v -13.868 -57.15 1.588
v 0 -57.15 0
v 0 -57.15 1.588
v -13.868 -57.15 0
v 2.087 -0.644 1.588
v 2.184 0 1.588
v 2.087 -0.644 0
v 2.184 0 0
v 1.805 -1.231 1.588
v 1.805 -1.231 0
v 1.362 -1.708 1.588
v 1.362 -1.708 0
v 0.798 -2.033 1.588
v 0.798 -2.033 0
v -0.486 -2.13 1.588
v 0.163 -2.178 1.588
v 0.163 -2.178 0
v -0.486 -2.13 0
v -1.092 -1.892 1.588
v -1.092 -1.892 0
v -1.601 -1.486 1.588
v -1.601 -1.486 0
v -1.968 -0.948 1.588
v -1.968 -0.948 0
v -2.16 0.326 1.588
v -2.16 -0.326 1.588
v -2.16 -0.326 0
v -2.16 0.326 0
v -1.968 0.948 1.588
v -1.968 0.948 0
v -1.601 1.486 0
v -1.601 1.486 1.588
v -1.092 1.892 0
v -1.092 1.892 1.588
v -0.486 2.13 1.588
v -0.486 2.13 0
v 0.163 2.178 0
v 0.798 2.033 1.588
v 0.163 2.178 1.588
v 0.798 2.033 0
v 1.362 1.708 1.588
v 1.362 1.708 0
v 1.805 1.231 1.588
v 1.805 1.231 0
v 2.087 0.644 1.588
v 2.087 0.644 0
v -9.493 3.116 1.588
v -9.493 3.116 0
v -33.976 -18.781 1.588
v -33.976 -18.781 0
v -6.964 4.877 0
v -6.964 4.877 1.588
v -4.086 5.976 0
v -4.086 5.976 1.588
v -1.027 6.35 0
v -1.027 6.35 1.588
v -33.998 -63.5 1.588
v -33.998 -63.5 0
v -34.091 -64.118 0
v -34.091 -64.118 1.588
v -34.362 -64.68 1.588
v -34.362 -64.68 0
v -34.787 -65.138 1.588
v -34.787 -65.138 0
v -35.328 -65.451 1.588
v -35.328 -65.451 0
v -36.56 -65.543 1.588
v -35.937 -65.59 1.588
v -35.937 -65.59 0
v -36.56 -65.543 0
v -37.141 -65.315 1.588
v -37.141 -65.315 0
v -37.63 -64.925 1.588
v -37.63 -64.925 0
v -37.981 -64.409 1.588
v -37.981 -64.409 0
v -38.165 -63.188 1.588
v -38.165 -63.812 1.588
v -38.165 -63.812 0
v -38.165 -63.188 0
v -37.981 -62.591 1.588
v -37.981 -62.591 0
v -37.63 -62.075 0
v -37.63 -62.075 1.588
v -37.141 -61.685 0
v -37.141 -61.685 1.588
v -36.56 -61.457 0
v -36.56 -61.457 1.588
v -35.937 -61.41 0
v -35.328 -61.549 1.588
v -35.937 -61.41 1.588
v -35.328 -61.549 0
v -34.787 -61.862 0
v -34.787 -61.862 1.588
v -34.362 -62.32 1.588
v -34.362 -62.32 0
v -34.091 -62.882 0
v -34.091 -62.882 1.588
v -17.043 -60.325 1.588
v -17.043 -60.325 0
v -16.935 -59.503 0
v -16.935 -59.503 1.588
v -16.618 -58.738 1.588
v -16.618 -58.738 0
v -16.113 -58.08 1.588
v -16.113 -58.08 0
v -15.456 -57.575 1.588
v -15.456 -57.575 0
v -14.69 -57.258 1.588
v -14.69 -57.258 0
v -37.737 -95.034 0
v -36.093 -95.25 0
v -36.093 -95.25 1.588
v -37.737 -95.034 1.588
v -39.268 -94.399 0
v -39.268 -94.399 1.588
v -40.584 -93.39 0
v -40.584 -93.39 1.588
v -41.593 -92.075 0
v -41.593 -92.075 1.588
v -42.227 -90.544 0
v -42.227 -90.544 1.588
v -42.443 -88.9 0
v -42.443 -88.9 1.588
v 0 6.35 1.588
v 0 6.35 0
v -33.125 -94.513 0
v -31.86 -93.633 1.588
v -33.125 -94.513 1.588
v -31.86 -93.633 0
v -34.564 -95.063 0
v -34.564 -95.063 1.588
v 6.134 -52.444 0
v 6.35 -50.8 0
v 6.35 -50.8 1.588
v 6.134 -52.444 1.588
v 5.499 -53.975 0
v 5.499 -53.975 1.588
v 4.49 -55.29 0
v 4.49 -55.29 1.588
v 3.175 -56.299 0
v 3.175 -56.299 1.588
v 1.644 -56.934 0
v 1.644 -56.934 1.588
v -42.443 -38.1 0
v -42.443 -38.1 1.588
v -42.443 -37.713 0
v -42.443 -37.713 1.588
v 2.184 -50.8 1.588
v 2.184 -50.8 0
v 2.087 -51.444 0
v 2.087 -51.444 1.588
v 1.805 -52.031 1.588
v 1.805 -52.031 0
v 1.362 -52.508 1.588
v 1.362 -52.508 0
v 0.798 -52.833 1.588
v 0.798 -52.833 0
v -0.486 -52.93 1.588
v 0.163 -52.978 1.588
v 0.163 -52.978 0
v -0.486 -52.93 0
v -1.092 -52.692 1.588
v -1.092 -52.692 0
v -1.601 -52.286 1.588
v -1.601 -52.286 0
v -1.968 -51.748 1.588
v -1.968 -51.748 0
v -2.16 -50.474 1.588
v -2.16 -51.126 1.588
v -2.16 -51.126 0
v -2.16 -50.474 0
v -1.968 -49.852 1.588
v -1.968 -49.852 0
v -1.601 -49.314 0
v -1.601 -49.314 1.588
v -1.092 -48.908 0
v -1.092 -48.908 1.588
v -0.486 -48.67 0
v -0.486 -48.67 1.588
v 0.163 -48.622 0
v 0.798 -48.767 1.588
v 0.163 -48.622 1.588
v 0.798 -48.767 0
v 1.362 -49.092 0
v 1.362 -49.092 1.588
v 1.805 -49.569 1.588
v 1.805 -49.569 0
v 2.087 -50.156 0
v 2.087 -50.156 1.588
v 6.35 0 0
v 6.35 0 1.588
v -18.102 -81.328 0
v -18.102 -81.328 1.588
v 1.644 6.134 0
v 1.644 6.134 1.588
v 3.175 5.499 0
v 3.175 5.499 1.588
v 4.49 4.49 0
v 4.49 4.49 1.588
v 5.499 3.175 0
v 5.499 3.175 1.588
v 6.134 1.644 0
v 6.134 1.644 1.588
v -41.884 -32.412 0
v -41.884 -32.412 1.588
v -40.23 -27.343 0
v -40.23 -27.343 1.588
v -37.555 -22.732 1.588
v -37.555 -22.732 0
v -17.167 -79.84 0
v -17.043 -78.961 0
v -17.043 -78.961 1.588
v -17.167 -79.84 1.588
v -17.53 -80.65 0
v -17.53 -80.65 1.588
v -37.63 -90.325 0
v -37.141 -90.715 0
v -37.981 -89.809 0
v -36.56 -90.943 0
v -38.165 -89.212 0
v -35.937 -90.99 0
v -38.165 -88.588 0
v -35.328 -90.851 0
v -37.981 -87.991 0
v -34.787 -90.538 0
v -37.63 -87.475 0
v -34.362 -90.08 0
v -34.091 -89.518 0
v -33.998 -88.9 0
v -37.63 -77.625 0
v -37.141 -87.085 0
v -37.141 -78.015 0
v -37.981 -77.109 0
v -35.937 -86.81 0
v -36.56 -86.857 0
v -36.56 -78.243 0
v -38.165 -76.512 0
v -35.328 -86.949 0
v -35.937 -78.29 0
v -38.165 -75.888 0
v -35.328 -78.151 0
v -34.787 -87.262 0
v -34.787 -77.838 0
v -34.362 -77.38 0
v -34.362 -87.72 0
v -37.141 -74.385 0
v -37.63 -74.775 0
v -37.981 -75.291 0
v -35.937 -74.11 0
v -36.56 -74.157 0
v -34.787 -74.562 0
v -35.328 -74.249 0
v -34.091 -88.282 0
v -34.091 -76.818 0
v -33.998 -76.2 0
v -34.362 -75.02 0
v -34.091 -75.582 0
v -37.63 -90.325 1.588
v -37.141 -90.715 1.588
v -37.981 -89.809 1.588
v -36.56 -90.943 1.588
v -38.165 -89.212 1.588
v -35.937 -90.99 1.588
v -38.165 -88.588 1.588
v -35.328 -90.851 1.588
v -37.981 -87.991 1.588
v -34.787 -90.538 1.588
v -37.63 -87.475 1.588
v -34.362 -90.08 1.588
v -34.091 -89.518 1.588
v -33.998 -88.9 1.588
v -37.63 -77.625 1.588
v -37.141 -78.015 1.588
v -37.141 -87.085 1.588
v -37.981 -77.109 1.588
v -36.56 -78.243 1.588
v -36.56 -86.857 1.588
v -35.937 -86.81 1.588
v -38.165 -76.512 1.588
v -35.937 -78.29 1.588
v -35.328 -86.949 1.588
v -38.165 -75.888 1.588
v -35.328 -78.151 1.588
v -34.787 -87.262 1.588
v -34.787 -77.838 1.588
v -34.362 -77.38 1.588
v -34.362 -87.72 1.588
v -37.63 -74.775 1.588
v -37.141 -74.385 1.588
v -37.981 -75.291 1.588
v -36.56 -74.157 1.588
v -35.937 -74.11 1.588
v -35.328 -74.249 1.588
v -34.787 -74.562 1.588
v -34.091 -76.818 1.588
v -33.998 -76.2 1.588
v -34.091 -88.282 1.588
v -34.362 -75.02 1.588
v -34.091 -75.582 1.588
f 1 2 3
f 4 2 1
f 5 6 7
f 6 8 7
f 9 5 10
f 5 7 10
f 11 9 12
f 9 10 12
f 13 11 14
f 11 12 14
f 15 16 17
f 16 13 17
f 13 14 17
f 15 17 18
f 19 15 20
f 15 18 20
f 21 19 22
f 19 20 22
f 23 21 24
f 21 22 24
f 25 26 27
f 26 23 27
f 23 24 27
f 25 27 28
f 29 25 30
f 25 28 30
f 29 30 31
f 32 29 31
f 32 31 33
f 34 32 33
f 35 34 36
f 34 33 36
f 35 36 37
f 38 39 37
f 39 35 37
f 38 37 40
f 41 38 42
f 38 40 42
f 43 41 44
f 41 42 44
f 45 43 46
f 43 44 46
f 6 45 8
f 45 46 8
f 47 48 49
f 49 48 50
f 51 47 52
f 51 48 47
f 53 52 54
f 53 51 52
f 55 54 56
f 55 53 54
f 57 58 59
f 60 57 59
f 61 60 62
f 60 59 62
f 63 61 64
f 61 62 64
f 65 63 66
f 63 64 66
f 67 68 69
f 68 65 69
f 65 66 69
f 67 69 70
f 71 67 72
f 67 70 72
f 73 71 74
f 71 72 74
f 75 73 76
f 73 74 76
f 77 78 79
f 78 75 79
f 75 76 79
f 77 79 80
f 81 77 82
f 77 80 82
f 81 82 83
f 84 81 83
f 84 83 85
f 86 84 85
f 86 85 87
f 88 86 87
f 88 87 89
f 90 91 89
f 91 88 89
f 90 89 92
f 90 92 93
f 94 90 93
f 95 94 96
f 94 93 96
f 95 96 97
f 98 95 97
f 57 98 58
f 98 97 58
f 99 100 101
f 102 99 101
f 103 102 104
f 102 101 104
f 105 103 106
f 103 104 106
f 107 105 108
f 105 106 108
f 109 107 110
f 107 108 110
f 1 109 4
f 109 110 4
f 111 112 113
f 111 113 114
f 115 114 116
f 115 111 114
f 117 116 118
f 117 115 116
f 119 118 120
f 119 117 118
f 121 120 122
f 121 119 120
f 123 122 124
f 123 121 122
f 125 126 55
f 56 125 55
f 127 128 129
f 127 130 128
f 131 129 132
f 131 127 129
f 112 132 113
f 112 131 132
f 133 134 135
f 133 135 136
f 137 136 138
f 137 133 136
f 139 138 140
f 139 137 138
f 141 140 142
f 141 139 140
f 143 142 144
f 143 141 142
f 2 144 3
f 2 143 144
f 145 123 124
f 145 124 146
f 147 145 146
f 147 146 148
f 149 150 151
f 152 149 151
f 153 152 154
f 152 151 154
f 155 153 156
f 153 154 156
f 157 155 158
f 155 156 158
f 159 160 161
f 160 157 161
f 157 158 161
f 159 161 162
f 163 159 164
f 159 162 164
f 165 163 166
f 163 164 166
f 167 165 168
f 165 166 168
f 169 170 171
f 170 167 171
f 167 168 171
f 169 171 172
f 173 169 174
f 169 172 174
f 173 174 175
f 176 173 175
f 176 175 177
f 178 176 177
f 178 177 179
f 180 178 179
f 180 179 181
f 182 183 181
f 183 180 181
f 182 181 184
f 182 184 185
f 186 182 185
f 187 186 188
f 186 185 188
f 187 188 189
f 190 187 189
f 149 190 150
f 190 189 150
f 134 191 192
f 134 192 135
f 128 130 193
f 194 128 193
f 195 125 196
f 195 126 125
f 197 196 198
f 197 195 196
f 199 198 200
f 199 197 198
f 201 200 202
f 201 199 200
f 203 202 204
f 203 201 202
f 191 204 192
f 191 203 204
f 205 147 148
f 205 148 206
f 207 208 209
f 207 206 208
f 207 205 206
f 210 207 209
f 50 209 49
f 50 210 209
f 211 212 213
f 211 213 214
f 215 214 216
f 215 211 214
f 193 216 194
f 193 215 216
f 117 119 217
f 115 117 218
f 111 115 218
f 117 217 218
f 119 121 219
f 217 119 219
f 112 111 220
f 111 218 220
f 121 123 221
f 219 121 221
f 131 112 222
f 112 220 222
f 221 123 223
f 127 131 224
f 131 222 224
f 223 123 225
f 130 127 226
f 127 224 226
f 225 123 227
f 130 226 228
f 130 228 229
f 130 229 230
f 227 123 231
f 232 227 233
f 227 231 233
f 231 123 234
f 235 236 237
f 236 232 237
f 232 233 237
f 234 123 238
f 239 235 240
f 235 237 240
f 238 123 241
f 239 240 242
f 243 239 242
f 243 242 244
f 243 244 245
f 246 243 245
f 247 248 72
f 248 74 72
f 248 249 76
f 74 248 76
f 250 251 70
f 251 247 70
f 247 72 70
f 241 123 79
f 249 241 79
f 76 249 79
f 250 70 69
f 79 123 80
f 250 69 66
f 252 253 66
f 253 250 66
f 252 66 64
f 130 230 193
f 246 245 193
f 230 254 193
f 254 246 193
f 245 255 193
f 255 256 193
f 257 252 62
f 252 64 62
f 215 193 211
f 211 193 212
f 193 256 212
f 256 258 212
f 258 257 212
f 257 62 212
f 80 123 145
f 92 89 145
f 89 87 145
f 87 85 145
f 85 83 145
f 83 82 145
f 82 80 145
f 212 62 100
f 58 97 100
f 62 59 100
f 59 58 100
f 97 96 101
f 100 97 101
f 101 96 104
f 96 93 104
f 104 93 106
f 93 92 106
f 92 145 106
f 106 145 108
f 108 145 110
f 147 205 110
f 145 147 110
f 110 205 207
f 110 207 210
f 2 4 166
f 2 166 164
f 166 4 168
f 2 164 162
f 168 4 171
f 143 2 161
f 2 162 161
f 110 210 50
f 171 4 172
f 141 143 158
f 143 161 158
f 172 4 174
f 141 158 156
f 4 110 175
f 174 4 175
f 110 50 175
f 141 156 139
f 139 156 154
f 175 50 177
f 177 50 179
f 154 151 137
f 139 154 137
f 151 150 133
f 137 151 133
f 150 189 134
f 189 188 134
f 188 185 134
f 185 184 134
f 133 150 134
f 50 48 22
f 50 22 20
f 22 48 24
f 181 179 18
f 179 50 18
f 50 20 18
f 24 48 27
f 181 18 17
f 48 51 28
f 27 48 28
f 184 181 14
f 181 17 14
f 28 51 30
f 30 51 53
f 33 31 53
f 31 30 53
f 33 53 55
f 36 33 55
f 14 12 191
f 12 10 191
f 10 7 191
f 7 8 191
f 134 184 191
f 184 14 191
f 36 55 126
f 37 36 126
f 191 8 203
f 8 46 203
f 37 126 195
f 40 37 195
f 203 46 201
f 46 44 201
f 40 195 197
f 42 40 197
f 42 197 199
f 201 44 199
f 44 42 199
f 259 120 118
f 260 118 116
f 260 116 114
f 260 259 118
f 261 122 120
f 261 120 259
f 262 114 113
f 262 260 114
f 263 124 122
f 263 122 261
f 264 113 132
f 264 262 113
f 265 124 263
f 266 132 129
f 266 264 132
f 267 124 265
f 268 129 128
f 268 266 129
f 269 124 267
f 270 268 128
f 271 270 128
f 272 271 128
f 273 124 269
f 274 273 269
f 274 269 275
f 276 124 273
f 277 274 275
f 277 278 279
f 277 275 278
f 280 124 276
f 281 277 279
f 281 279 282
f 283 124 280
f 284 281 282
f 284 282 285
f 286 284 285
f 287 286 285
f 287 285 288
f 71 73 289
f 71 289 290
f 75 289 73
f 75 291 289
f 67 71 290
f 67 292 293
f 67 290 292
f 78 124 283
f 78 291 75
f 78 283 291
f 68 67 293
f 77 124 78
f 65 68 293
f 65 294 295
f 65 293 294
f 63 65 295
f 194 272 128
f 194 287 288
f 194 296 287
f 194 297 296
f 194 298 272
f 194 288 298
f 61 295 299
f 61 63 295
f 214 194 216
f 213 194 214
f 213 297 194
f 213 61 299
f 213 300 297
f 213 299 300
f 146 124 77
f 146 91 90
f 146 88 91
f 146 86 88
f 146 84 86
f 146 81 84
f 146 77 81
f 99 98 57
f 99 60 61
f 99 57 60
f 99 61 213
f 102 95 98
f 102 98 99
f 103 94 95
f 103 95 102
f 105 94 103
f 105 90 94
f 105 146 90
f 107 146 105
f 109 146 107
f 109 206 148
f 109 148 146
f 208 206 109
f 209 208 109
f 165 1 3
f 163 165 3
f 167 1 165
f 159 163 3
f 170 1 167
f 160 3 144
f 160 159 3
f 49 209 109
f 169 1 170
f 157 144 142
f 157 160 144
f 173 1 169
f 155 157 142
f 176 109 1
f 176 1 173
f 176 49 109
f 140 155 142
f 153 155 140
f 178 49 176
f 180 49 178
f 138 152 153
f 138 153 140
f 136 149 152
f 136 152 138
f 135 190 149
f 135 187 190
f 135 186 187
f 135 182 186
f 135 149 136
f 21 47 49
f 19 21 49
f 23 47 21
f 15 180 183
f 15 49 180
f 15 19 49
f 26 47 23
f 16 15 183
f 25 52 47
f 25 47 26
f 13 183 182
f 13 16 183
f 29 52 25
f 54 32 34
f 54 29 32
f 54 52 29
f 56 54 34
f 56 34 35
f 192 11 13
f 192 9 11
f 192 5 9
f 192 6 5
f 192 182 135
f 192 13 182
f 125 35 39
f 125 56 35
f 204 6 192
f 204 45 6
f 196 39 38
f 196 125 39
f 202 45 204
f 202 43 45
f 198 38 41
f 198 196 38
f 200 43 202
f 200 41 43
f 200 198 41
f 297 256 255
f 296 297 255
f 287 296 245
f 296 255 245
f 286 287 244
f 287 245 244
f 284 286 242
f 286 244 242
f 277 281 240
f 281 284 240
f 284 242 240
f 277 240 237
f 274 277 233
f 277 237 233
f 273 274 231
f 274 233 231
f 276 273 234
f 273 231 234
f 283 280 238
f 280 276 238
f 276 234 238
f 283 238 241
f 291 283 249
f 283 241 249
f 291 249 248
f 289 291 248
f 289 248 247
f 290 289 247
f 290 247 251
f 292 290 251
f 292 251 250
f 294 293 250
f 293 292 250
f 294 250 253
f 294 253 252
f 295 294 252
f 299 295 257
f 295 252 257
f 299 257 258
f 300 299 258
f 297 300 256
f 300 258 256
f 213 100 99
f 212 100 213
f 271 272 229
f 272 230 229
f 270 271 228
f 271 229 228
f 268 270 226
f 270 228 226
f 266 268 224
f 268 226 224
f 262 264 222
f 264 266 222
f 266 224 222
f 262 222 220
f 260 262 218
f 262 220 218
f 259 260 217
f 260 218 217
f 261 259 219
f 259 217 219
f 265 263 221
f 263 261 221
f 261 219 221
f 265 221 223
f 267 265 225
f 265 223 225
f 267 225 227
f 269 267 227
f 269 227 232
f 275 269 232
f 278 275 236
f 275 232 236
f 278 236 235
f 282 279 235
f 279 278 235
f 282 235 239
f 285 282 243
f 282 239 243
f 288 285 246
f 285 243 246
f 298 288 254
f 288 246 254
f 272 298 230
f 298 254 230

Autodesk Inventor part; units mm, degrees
ref_plane "YZ Plane" through (0, 0, 0) normal (1, 0, 0) x (0, 1, 0)
ref_plane "XZ Plane" through (0, 0, 0) normal (0, 1, 0) x (-1, 0, 0)
ref_plane "XY Plane" through (0, 0, 0) normal (0, 0, 1) x (1, 0, 0)
sketch "main" plane through (0, 0, 0) normal (0, 0, 1) x (1, 0, 0)
  line L0 (-27.3481, 7.6574) -> (-27.3481, 8.0441)
  circle A0 centre (-20.9981, -17.7426) radius 2.0955
  line L1 (-27.3481, -43.1426) -> (-27.3481, 8.0441)
  line L2 (-16.7649, -47.8757) -> (-3.0065, -35.5705)
  circle A1 centre (-20.9981, -43.1426) radius 2.0955
  arc A2 (-27.3481, -43.1426) -> (-20.9981, -49.4926) centre (-20.9981, -43.1426) ccw
  arc A3 (-27.3481, -43.1426) -> (-16.7649, -47.8757) centre (-20.9981, -43.1426) ccw
  arc A4 (21.4453, 45.7574) -> (15.0953, 52.1074) centre (15.0953, 45.7574) ccw
  arc A5 (-18.881, 26.9766) -> (-27.3481, 8.0441) centre (-1.9481, 8.0441) ccw
  line L3 (21.4453, 45.7574) -> (21.4453, -5.0426)
  line L4 (5.602, 48.8737) -> (-18.881, 26.9766)
  circle A6 centre (15.0953, 45.7574) radius 2.1844
  line L5 (15.0953, 52.1074) -> (14.0684, 52.1074)
  arc A7 (14.0684, 52.1074) -> (5.602, 48.8737) centre (14.0684, 39.4074) ccw
  circle A8 centre (15.0953, -5.0426) radius 2.1844
  arc A9 (15.0953, -11.3926) -> (21.4453, -5.0426) centre (15.0953, -5.0426) ccw
  line L6 (15.0953, -11.3926) -> (1.2269, -11.3926)
  line L7 (-1.9481, -14.5676) -> (-1.9481, -33.2039)
  arc A10 (1.2269, -11.3926) -> (-1.9481, -14.5676) centre (1.2269, -14.5676) ccw
  arc A11 (-3.0065, -35.5705) -> (-1.9481, -33.2039) centre (-5.1231, -33.2039) ccw
  point P0 (-2.0277, 1.4023)
  point P1 (-1.9481, -34.6239)
  point P2 (9.2176, 52.1074)
  dimension "d1" = 12.7
  dimension "d5" = 4.191
  dimension "d6" = 4.191
  dimension "d8" = 4.3688
  dimension "d9" = 3.175
  dimension "d10" = 25.4
sketch "Sketch1" plane through (0, 0, 0) normal (0, 0, 1) x (1, 0, 0)
  circle A0 centre (-36.0934, -76.2) radius 2.0955
  line L0 (-42.4434, -38.1) -> (-42.4434, -37.7133)
  circle A1 centre (-36.0934, -63.5) radius 2.0955
  line L1 (-42.4434, -88.9) -> (-42.4434, -37.7133)
  line L2 (-31.8602, -93.6331) -> (-18.1018, -81.3279)
  circle A2 centre (-36.0934, -88.9) radius 2.0955
  arc A3 (-42.4434, -88.9) -> (-36.0934, -95.25) centre (-36.0934, -88.9) ccw
  arc A4 (-42.4434, -88.9) -> (-31.8602, -93.6331) centre (-36.0934, -88.9) ccw
  arc A5 (6.35, 0) -> (0, 6.35) centre (0, 0) ccw
  arc A6 (-33.9762, -18.7808) -> (-42.4434, -37.7133) centre (-17.0434, -37.7133) ccw
  line L3 (6.35, 0) -> (6.35, -50.8)
  line L4 (-9.4933, 3.1162) -> (-33.9762, -18.7808)
  circle A7 centre (0, 0) radius 2.1844
  line L5 (0, 6.35) -> (-1.0269, 6.35)
  arc A8 (-1.0269, 6.35) -> (-9.4933, 3.1162) centre (-1.0269, -6.35) ccw
  circle A9 centre (0, -50.8) radius 2.1844
  arc A10 (0, -57.15) -> (6.35, -50.8) centre (0, -50.8) ccw
  line L6 (0, -57.15) -> (-13.8684, -57.15)
  line L7 (-17.0434, -60.325) -> (-17.0434, -78.9613)
  arc A11 (-13.8684, -57.15) -> (-17.0434, -60.325) centre (-13.8684, -60.325) ccw
  arc A12 (-18.1018, -81.3279) -> (-17.0434, -78.9613) centre (-20.2184, -78.9613) ccw
  point P0 (-42.4434, -38.1)
  dimension "d4" = 4.191
extrude "Extrusion1" add sketch "Sketch1" along normal blind 1.5875
properties part number "sled" material "Acetal Resin, White"
